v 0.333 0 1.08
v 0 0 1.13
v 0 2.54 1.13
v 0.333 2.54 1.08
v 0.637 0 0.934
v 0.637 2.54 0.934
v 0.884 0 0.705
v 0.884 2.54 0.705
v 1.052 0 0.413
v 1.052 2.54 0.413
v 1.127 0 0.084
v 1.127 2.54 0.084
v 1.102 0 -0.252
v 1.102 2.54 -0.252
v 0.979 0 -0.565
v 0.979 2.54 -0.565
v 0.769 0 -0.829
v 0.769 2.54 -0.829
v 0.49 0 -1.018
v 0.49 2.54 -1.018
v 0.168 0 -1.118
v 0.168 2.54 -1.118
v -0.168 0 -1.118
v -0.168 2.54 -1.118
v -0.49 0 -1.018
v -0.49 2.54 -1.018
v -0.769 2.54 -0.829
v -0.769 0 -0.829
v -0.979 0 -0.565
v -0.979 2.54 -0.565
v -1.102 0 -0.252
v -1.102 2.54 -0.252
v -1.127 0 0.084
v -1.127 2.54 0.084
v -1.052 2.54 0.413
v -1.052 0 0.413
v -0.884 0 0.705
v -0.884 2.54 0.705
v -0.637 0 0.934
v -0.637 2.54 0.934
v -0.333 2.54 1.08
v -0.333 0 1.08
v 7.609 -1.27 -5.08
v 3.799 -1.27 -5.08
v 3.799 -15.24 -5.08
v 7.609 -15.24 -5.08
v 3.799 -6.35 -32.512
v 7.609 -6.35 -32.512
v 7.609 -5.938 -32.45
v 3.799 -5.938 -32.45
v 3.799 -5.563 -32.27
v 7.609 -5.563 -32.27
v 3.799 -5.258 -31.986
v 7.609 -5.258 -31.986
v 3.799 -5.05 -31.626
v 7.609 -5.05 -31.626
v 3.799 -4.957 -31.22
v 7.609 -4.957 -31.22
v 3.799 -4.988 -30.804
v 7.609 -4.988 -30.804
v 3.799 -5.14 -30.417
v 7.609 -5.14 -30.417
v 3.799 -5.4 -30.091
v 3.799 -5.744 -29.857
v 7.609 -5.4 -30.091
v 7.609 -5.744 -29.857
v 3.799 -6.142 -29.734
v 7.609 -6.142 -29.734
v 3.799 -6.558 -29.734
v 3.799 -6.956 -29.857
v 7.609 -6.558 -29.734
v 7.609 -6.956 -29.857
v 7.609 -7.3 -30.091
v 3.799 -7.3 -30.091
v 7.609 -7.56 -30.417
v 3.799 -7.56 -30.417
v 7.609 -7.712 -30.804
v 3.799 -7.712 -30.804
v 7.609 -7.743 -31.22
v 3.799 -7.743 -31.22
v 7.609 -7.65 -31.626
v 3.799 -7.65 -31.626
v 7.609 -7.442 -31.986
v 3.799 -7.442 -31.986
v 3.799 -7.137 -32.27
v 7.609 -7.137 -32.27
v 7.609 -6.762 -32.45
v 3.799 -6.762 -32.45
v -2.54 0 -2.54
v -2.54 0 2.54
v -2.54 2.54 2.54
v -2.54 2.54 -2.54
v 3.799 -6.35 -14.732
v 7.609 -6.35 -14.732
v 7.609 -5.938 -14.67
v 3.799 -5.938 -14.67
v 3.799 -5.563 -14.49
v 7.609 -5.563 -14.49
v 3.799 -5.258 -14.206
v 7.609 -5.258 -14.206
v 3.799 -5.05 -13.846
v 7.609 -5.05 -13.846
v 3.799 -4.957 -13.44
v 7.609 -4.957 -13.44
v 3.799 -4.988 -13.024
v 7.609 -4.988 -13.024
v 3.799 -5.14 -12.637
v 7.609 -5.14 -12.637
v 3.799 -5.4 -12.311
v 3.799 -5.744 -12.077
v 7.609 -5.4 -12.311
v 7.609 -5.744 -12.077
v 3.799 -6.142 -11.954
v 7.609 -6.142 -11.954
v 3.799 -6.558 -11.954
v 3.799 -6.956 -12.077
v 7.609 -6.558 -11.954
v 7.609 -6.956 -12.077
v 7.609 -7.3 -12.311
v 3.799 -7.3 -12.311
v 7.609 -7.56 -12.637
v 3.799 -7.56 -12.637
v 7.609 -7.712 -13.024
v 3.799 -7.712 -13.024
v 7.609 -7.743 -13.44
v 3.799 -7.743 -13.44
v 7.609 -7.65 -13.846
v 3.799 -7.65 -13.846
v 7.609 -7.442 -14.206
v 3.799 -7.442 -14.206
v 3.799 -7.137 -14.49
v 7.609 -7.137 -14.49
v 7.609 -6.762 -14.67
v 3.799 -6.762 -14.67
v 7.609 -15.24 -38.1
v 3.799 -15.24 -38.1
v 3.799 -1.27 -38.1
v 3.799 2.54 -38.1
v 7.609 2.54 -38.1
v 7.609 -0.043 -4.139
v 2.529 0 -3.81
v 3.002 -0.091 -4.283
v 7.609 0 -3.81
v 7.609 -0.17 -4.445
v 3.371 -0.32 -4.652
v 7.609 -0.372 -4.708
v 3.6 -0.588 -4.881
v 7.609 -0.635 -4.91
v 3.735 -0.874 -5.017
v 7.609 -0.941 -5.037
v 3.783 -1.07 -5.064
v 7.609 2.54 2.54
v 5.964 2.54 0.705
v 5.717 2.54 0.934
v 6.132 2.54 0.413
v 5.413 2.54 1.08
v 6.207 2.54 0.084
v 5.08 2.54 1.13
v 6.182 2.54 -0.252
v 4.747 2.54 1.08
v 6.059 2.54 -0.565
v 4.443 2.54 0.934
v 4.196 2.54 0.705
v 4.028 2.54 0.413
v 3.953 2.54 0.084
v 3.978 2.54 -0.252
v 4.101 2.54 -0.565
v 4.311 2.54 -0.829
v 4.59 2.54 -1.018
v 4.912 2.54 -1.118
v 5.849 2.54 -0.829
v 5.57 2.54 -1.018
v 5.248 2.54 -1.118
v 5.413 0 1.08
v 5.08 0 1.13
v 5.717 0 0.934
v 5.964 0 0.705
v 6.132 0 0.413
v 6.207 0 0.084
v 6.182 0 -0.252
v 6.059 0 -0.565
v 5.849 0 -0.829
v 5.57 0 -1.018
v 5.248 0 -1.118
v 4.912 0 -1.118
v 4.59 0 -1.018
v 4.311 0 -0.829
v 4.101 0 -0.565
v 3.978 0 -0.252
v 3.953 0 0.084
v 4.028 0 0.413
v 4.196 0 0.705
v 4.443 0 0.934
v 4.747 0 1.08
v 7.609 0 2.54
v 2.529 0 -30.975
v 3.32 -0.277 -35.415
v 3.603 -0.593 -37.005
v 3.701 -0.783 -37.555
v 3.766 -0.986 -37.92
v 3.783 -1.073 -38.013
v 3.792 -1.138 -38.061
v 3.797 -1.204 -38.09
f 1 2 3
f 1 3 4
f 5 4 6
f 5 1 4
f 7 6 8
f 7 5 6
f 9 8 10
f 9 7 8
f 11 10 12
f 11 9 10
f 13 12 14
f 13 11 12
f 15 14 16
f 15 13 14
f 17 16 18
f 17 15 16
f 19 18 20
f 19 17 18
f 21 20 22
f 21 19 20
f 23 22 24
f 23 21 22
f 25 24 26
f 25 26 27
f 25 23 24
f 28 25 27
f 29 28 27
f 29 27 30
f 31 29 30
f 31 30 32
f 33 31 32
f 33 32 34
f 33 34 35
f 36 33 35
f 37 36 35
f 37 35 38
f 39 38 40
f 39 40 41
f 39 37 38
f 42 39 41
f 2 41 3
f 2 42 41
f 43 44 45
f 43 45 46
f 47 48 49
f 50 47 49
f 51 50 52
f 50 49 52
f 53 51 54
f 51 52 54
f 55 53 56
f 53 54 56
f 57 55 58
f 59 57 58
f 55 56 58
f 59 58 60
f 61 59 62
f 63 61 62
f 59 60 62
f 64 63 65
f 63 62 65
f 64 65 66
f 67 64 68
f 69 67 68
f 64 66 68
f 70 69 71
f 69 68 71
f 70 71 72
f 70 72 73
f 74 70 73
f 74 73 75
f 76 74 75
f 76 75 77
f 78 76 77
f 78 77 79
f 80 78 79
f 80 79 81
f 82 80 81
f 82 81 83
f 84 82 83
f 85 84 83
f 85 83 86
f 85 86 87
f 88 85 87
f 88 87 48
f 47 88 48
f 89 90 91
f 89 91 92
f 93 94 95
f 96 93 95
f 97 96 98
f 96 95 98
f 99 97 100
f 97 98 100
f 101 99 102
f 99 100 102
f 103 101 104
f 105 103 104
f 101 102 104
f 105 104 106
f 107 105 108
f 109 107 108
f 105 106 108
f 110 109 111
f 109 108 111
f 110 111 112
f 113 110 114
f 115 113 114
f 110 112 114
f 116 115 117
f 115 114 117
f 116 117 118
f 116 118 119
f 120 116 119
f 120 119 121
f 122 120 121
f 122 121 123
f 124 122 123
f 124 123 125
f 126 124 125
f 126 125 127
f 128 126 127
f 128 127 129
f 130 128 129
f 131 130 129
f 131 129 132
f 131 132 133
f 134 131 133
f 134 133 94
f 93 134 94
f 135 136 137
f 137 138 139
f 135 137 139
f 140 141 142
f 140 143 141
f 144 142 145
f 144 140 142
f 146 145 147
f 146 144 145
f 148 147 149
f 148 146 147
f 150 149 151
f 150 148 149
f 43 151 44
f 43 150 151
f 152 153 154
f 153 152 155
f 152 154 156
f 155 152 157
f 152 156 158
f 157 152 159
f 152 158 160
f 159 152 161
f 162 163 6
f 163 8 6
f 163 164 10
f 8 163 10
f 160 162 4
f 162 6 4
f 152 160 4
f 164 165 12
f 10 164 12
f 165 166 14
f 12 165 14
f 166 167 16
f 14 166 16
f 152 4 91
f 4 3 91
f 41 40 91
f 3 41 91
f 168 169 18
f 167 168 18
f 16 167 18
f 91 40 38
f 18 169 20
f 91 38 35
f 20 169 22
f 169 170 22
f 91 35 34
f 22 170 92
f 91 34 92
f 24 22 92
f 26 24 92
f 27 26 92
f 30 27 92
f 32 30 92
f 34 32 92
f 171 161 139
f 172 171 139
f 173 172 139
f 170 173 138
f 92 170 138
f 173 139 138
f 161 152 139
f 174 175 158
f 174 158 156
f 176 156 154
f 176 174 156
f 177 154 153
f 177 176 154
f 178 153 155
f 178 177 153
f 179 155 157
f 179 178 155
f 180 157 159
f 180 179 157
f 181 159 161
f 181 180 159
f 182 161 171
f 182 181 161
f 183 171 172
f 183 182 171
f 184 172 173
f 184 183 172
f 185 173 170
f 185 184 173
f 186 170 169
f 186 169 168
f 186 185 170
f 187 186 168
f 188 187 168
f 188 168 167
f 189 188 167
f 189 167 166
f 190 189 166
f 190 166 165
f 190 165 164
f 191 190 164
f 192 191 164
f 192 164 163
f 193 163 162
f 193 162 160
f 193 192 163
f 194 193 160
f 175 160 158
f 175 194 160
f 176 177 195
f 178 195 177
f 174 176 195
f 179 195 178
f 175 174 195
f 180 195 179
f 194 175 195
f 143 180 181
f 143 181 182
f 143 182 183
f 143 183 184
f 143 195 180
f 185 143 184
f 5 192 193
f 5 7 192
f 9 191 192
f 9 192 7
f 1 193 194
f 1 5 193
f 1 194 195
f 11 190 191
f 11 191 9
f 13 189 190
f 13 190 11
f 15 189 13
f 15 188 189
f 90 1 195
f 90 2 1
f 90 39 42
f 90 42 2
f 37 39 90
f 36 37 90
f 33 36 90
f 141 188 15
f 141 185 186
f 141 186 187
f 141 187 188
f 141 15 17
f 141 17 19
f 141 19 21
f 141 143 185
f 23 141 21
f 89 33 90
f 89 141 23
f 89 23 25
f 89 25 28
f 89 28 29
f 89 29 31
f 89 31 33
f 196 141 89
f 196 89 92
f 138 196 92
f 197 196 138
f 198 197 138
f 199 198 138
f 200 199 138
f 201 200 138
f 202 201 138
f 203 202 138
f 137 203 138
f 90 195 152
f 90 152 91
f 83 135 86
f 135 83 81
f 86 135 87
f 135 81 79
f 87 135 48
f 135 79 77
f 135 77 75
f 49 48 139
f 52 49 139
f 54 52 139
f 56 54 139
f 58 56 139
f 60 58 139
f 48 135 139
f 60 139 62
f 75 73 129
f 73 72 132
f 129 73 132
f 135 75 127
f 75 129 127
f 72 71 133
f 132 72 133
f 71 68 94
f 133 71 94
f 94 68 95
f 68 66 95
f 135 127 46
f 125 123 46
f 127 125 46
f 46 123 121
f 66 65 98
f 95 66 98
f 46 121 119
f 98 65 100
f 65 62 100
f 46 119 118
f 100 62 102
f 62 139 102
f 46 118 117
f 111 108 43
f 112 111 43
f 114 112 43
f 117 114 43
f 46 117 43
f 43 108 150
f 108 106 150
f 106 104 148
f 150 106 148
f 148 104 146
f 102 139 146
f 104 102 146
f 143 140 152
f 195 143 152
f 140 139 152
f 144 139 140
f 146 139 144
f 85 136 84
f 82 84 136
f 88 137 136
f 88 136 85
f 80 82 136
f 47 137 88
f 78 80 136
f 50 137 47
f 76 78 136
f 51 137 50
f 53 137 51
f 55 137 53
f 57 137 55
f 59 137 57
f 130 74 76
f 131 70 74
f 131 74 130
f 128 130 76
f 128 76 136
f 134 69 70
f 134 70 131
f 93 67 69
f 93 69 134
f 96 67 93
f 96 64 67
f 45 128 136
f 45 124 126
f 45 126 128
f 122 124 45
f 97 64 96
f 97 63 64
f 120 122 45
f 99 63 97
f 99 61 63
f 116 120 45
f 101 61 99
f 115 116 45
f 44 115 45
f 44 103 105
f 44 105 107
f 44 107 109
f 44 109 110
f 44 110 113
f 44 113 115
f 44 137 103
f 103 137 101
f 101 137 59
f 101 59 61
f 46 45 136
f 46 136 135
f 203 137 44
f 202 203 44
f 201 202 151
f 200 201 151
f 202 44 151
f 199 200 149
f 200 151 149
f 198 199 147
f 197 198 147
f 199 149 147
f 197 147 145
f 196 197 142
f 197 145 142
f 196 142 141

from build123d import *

# Parameters (mm, degrees)
SKETCH1_R           = 1.1303
BOSS_EXTRUDE1_DEPTH = 2.54
SKETCH2_W           = 3.81
SKETCH2_H           = 33.02
BOSS_EXTRUDE2_DEPTH = 15.24
FILLET1_R           = 1.27
SKETCH3_R           = 1.397
CUT_EXTRUDE1_DEPTH  = 12.7


with BuildPart() as part:
    # Sketch1 → Boss-Extrude1 (new body)
    with BuildSketch(Plane(origin=(0, 0, 0), x_dir=(1, 0, 0), z_dir=(0, 1, 0))):
        Polygon((-2.54, 2.54), (3.79857, 38.1), (7.60857, 38.1), (7.60857, 2.54), (7.60857, -2.54), (-2.54, -2.54), align=None)
        with Locations(Location((0, 0, 0), (0, 0, 270))):
            Circle(SKETCH1_R, mode=Mode.SUBTRACT)
        with Locations(Location((5.08, 0, 0), (0, 0, 270))):
            Circle(SKETCH1_R, mode=Mode.SUBTRACT)
    extrude(amount=BOSS_EXTRUDE1_DEPTH)

    # Sketch2 → Boss-Extrude2 (add)
    with BuildSketch(Plane.XZ):
        with Locations((5.70357, -21.59)):
            Rectangle(SKETCH2_W, SKETCH2_H)
    extrude(amount=BOSS_EXTRUDE2_DEPTH)

    # Fillet1
    fillet1_edges = [part.edges().sort_by_distance(p)[0] for p in [
        (5.70357, 0, -5.08),
        (3.79857, 0, -21.59),
    ]]
    fillet(fillet1_edges, radius=FILLET1_R)

    # Sketch3 → Cut-Extrude1 (cut)
    with BuildSketch(Plane(origin=(7.60857, 0, 0), x_dir=(0, 0, -1), z_dir=(1, 0, 0))):
        with Locations((13.335254, -6.35)):
            Circle(SKETCH3_R)
        with Locations((31.115254, -6.35)):
            Circle(SKETCH3_R)
    extrude(amount=-CUT_EXTRUDE1_DEPTH, mode=Mode.SUBTRACT)


solid = part.part
